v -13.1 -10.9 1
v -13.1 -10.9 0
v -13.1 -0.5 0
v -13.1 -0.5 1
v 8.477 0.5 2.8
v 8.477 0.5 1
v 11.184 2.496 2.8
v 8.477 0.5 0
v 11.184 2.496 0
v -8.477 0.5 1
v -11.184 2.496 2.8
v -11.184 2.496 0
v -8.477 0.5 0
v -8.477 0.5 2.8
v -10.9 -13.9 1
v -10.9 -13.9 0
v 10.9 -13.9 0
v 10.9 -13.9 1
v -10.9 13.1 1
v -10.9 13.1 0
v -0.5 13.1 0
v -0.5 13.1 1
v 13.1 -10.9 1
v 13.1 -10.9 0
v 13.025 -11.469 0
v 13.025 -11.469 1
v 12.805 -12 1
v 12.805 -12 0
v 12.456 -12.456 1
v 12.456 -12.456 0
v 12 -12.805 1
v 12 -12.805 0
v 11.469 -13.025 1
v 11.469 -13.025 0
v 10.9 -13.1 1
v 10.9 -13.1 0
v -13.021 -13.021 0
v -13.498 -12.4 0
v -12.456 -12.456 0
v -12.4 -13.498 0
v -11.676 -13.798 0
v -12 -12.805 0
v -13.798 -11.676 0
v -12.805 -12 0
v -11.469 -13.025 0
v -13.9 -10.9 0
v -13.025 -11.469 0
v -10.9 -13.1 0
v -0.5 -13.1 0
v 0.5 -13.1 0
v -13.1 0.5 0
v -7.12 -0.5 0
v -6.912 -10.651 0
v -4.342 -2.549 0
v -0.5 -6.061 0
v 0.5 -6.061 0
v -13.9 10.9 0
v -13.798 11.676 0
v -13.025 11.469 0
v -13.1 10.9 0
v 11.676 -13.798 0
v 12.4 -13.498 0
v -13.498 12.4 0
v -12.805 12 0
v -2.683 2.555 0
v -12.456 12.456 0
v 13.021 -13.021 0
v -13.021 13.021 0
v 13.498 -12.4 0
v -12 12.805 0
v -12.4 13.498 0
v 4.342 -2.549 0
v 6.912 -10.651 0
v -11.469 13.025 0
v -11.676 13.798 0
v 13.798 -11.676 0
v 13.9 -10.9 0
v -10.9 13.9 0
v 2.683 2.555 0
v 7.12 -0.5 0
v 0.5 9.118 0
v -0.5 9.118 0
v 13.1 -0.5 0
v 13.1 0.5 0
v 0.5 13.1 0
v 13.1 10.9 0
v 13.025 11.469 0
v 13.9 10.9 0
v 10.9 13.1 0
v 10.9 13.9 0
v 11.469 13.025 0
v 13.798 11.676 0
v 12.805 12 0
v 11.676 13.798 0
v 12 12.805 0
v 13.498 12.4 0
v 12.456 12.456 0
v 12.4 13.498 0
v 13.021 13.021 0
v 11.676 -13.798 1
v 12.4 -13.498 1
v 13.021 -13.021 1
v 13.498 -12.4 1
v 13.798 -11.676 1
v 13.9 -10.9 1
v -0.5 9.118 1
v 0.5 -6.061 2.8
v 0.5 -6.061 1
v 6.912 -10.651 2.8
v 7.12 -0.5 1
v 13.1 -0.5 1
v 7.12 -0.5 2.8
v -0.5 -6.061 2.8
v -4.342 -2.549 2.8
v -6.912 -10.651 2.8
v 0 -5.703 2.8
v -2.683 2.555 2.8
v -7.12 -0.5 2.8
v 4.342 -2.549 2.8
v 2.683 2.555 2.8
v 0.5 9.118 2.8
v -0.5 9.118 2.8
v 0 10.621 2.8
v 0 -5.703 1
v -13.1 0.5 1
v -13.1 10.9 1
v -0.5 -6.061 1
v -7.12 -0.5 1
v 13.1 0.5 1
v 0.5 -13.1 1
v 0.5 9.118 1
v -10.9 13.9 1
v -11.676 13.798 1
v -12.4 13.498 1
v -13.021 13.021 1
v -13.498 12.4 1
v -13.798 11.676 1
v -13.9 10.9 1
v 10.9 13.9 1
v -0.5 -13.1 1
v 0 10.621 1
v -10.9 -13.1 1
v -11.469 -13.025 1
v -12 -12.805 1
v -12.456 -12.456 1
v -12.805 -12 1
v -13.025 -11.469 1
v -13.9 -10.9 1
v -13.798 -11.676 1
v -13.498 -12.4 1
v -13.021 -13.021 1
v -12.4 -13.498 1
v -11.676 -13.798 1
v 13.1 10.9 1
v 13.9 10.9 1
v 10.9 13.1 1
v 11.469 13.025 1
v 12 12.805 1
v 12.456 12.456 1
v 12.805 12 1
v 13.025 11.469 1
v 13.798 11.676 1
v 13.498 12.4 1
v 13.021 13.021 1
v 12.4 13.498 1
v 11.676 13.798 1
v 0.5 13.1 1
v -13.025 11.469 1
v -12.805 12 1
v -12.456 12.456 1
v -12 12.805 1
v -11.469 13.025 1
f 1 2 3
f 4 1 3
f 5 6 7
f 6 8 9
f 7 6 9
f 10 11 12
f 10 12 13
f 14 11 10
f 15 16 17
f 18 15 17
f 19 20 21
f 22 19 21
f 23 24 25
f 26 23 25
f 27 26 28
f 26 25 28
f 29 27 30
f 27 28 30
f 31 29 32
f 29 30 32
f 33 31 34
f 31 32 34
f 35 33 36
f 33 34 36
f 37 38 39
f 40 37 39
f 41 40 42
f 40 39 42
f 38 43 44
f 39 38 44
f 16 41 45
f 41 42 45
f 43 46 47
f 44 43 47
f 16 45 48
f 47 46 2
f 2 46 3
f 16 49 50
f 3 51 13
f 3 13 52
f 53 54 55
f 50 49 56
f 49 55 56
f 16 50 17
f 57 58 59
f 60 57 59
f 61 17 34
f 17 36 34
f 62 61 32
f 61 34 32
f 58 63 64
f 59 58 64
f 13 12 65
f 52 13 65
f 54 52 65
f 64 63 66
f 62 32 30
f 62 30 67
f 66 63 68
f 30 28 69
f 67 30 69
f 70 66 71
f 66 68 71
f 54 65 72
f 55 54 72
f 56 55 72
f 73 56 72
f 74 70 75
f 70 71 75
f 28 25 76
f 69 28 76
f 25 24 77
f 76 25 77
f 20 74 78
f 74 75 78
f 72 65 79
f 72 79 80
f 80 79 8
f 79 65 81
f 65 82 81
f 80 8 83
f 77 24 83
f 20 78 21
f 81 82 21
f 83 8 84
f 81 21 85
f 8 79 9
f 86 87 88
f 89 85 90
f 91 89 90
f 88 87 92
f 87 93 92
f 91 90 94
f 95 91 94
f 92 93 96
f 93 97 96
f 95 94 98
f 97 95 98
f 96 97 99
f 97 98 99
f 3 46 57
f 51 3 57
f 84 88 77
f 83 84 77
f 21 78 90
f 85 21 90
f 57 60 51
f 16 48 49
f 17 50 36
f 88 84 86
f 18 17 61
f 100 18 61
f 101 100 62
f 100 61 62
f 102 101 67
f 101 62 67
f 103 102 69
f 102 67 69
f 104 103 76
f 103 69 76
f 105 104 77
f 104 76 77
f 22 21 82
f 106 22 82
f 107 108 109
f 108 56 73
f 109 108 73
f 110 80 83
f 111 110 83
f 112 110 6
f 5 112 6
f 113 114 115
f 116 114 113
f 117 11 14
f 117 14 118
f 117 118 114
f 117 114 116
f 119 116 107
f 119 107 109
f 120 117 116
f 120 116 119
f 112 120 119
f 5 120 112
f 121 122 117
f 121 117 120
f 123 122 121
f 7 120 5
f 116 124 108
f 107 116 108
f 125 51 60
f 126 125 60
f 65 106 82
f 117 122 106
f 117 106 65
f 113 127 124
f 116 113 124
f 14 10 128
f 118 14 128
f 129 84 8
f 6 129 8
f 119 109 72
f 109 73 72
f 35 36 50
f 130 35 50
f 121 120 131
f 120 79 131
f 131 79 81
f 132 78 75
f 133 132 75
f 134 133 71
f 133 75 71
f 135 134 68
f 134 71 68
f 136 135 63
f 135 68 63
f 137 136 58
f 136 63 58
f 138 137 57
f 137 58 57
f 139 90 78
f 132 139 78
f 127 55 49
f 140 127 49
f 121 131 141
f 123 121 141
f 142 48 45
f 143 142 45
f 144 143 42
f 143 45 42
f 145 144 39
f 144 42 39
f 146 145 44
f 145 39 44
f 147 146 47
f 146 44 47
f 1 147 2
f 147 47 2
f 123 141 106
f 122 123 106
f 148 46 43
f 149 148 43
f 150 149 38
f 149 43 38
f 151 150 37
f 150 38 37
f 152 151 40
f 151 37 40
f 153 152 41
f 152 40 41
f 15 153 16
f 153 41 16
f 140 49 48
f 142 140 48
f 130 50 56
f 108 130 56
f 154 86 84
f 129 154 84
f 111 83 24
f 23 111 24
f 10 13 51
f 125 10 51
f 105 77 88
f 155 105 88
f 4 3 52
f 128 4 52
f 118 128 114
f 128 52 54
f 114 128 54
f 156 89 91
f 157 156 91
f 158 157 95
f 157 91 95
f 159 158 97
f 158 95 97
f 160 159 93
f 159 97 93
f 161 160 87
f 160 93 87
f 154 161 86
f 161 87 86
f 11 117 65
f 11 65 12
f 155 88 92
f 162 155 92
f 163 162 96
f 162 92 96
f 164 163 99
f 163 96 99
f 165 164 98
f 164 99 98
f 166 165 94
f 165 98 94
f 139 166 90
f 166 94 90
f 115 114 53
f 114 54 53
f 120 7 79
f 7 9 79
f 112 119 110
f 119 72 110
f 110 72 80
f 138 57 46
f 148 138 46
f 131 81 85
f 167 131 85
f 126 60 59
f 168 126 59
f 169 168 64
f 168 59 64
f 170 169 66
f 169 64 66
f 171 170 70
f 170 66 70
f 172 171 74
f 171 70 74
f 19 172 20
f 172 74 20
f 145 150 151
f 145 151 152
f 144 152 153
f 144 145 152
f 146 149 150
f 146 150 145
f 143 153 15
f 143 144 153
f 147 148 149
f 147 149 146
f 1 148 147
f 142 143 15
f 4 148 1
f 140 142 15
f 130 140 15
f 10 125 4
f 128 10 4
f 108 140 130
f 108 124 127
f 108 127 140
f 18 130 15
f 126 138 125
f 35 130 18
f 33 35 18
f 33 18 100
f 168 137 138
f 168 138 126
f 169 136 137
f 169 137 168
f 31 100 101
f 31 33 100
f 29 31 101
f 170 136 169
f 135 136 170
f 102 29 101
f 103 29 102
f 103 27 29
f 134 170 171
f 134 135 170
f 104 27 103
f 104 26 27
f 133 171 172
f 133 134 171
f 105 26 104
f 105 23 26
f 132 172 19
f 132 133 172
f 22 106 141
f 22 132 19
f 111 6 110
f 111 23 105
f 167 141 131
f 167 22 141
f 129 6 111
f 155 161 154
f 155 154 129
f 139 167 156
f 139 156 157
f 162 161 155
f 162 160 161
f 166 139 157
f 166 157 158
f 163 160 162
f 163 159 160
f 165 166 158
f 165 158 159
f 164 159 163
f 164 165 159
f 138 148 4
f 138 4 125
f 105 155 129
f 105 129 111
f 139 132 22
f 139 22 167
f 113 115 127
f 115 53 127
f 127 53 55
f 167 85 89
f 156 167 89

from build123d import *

# Parameters (mm, degrees)
F1_DEPTH = 1
F3_DEPTH = 1.8
F4_DEPTH = 1


with BuildPart() as f1:
    # F0 (on Top) → F1 (new body)
    with BuildSketch(Plane.XY):
        with BuildLine():
            ThreePointArc((-10.9, 13.9), (-13.0213203436, 13.0213203436), (-13.9, 10.9))
            Line((-13.9, 10.9), (-13.9, -10.9))
            ThreePointArc((-13.9, -10.9), (-13.0213203436, -13.0213203436), (-10.9, -13.9))
            Line((-10.9, -13.9), (10.9, -13.9))
            ThreePointArc((10.9, -13.9), (13.0213203436, -13.0213203436), (13.9, -10.9))
            Line((13.9, -10.9), (13.9, 10.9))
            ThreePointArc((13.9, 10.9), (13.0213203436, 13.0213203436), (10.9, 13.9))
            Line((10.9, 13.9), (-10.9, 13.9))
        make_face()
        with BuildLine():
            Line((-13.1, -0.5), (-0.5, -0.5))
            Line((-0.5, -0.5), (-0.5, -13.1))
            Line((-0.5, -13.1), (-10.9, -13.1))
            ThreePointArc((-10.9, -13.1), (-12.4556349186, -12.4556349186), (-13.1, -10.9))
            Line((-13.1, -10.9), (-13.1, -0.5))
        make_face(mode=Mode.SUBTRACT)
        with BuildLine():
            Line((10.9, -13.1), (0.5, -13.1))
            Line((0.5, -13.1), (0.5, -0.5))
            Line((0.5, -0.5), (13.1, -0.5))
            Line((13.1, -0.5), (13.1, -10.9))
            ThreePointArc((13.1, -10.9), (12.4556349186, -12.4556349186), (10.9, -13.1))
        make_face(mode=Mode.SUBTRACT)
        with BuildLine():
            Line((-10.9, 13.1), (-0.5, 13.1))
            Line((-0.5, 13.1), (-0.5, 0.5))
            Line((-0.5, 0.5), (-13.1, 0.5))
            Line((-13.1, 0.5), (-13.1, 10.9))
            ThreePointArc((-13.1, 10.9), (-12.4556349186, 12.4556349186), (-10.9, 13.1))
        make_face(mode=Mode.SUBTRACT)
        with BuildLine():
            Line((13.1, 10.9), (13.1, 0.5))
            Line((13.1, 0.5), (0.5, 0.5))
            Line((0.5, 0.5), (0.5, 13.1))
            Line((0.5, 13.1), (10.9, 13.1))
            ThreePointArc((10.9, 13.1), (12.4556349186, 12.4556349186), (13.1, 10.9))
        make_face(mode=Mode.SUBTRACT)
    extrude(amount=F1_DEPTH)

    # F2 (on face) → F3 (join)
    with BuildSketch(Plane.XY.offset(1)):
        Polygon((-2.6832024986, 2.5549852797), (-11.1835549314, 2.4956311428), (-8.4767530422, 0.5), (-0.5, 0.5), (-0.5, 9.1179095817), align=None)
        Polygon((-0.5, 0.5), (-8.4767530422, 0.5), (-7.1203892177, -0.5), (-0.5, -0.5), (-0.5, -6.061026872), (0, -5.7030628772), (0.5, -6.061026872), (0.5, -0.5), (7.1203892177, -0.5), (8.4767530422, 0.5), (0.5, 0.5), (0.5, 9.1179095817), (0, 10.6209594147), (-0.5, 9.1179095817), align=None)
        Polygon((2.6832024986, 2.5549852797), (0.5, 9.1179095817), (0.5, 0.5), (8.4767530422, 0.5), (11.1835549314, 2.4956311428), align=None)
        Polygon((0.5, -0.5), (0.5, -6.061026872), (6.9118170627, -10.651426171), (4.3415128415, -2.548769162), (7.1203892177, -0.5), align=None)
        Polygon((-0.5, -0.5), (-7.1203892177, -0.5), (-4.3415128415, -2.548769162), (-6.9118170627, -10.651426171), (-0.5, -6.061026872), align=None)
    extrude(amount=F3_DEPTH)

    # F4 (add): faces of the model
    f4_faces = [f1.faces().sort_by_distance(p)[0] for p in [
        (-4.0960108107, 2.4354750497, 1),
        (-3.3222149953, -4.5114296876, 1),
        (3.3222149953, -4.5114296876, 1),
        (4.0960108107, 2.4354750497, 1),
    ]]
    extrude(f4_faces, amount=F4_DEPTH)


solid = f1.part
